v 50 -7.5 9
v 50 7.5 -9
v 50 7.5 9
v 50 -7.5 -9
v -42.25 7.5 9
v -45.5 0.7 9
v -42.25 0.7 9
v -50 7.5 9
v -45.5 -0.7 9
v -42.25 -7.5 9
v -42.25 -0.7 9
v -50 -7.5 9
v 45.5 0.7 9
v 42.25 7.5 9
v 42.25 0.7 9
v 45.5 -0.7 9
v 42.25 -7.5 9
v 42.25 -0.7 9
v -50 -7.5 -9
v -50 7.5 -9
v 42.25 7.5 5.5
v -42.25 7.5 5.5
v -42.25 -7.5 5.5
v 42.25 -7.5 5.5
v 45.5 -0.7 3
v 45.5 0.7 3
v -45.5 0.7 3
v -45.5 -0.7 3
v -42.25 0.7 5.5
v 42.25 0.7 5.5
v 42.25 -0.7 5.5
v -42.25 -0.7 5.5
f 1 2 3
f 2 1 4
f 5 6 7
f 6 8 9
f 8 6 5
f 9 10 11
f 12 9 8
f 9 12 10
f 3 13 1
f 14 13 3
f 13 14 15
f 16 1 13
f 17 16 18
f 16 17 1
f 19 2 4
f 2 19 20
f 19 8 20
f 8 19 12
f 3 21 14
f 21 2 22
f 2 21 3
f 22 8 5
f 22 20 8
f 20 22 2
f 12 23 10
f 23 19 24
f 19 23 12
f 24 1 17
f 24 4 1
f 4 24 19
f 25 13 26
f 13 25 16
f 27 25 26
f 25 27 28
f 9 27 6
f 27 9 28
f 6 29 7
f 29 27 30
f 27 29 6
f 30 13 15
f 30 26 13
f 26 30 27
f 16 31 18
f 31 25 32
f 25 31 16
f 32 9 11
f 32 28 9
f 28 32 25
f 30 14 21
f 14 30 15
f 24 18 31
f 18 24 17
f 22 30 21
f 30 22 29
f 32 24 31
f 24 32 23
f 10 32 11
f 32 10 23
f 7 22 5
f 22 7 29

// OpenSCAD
module diffGratHolder(hx, hy, hz, gx, gy, gz, sides, groove){
	difference(){
		cube([hx, hy, hz], center=true);
		translate([0,0,hz/2-gz/2]){
			#cube([gx, gy, gz], center=true);
		}
		translate([0,0,hz/2-gz/2+groove]){
			cube([gx-sides, hy, gz], center=true);
		}
		
	}
}

//diffGratHolder(60, 15, 18, 51, 1.5, 6, 6, 2);
diffGratHolder(100, 15, 18, 91, 1.4, 6, 6.5, 2.5);
